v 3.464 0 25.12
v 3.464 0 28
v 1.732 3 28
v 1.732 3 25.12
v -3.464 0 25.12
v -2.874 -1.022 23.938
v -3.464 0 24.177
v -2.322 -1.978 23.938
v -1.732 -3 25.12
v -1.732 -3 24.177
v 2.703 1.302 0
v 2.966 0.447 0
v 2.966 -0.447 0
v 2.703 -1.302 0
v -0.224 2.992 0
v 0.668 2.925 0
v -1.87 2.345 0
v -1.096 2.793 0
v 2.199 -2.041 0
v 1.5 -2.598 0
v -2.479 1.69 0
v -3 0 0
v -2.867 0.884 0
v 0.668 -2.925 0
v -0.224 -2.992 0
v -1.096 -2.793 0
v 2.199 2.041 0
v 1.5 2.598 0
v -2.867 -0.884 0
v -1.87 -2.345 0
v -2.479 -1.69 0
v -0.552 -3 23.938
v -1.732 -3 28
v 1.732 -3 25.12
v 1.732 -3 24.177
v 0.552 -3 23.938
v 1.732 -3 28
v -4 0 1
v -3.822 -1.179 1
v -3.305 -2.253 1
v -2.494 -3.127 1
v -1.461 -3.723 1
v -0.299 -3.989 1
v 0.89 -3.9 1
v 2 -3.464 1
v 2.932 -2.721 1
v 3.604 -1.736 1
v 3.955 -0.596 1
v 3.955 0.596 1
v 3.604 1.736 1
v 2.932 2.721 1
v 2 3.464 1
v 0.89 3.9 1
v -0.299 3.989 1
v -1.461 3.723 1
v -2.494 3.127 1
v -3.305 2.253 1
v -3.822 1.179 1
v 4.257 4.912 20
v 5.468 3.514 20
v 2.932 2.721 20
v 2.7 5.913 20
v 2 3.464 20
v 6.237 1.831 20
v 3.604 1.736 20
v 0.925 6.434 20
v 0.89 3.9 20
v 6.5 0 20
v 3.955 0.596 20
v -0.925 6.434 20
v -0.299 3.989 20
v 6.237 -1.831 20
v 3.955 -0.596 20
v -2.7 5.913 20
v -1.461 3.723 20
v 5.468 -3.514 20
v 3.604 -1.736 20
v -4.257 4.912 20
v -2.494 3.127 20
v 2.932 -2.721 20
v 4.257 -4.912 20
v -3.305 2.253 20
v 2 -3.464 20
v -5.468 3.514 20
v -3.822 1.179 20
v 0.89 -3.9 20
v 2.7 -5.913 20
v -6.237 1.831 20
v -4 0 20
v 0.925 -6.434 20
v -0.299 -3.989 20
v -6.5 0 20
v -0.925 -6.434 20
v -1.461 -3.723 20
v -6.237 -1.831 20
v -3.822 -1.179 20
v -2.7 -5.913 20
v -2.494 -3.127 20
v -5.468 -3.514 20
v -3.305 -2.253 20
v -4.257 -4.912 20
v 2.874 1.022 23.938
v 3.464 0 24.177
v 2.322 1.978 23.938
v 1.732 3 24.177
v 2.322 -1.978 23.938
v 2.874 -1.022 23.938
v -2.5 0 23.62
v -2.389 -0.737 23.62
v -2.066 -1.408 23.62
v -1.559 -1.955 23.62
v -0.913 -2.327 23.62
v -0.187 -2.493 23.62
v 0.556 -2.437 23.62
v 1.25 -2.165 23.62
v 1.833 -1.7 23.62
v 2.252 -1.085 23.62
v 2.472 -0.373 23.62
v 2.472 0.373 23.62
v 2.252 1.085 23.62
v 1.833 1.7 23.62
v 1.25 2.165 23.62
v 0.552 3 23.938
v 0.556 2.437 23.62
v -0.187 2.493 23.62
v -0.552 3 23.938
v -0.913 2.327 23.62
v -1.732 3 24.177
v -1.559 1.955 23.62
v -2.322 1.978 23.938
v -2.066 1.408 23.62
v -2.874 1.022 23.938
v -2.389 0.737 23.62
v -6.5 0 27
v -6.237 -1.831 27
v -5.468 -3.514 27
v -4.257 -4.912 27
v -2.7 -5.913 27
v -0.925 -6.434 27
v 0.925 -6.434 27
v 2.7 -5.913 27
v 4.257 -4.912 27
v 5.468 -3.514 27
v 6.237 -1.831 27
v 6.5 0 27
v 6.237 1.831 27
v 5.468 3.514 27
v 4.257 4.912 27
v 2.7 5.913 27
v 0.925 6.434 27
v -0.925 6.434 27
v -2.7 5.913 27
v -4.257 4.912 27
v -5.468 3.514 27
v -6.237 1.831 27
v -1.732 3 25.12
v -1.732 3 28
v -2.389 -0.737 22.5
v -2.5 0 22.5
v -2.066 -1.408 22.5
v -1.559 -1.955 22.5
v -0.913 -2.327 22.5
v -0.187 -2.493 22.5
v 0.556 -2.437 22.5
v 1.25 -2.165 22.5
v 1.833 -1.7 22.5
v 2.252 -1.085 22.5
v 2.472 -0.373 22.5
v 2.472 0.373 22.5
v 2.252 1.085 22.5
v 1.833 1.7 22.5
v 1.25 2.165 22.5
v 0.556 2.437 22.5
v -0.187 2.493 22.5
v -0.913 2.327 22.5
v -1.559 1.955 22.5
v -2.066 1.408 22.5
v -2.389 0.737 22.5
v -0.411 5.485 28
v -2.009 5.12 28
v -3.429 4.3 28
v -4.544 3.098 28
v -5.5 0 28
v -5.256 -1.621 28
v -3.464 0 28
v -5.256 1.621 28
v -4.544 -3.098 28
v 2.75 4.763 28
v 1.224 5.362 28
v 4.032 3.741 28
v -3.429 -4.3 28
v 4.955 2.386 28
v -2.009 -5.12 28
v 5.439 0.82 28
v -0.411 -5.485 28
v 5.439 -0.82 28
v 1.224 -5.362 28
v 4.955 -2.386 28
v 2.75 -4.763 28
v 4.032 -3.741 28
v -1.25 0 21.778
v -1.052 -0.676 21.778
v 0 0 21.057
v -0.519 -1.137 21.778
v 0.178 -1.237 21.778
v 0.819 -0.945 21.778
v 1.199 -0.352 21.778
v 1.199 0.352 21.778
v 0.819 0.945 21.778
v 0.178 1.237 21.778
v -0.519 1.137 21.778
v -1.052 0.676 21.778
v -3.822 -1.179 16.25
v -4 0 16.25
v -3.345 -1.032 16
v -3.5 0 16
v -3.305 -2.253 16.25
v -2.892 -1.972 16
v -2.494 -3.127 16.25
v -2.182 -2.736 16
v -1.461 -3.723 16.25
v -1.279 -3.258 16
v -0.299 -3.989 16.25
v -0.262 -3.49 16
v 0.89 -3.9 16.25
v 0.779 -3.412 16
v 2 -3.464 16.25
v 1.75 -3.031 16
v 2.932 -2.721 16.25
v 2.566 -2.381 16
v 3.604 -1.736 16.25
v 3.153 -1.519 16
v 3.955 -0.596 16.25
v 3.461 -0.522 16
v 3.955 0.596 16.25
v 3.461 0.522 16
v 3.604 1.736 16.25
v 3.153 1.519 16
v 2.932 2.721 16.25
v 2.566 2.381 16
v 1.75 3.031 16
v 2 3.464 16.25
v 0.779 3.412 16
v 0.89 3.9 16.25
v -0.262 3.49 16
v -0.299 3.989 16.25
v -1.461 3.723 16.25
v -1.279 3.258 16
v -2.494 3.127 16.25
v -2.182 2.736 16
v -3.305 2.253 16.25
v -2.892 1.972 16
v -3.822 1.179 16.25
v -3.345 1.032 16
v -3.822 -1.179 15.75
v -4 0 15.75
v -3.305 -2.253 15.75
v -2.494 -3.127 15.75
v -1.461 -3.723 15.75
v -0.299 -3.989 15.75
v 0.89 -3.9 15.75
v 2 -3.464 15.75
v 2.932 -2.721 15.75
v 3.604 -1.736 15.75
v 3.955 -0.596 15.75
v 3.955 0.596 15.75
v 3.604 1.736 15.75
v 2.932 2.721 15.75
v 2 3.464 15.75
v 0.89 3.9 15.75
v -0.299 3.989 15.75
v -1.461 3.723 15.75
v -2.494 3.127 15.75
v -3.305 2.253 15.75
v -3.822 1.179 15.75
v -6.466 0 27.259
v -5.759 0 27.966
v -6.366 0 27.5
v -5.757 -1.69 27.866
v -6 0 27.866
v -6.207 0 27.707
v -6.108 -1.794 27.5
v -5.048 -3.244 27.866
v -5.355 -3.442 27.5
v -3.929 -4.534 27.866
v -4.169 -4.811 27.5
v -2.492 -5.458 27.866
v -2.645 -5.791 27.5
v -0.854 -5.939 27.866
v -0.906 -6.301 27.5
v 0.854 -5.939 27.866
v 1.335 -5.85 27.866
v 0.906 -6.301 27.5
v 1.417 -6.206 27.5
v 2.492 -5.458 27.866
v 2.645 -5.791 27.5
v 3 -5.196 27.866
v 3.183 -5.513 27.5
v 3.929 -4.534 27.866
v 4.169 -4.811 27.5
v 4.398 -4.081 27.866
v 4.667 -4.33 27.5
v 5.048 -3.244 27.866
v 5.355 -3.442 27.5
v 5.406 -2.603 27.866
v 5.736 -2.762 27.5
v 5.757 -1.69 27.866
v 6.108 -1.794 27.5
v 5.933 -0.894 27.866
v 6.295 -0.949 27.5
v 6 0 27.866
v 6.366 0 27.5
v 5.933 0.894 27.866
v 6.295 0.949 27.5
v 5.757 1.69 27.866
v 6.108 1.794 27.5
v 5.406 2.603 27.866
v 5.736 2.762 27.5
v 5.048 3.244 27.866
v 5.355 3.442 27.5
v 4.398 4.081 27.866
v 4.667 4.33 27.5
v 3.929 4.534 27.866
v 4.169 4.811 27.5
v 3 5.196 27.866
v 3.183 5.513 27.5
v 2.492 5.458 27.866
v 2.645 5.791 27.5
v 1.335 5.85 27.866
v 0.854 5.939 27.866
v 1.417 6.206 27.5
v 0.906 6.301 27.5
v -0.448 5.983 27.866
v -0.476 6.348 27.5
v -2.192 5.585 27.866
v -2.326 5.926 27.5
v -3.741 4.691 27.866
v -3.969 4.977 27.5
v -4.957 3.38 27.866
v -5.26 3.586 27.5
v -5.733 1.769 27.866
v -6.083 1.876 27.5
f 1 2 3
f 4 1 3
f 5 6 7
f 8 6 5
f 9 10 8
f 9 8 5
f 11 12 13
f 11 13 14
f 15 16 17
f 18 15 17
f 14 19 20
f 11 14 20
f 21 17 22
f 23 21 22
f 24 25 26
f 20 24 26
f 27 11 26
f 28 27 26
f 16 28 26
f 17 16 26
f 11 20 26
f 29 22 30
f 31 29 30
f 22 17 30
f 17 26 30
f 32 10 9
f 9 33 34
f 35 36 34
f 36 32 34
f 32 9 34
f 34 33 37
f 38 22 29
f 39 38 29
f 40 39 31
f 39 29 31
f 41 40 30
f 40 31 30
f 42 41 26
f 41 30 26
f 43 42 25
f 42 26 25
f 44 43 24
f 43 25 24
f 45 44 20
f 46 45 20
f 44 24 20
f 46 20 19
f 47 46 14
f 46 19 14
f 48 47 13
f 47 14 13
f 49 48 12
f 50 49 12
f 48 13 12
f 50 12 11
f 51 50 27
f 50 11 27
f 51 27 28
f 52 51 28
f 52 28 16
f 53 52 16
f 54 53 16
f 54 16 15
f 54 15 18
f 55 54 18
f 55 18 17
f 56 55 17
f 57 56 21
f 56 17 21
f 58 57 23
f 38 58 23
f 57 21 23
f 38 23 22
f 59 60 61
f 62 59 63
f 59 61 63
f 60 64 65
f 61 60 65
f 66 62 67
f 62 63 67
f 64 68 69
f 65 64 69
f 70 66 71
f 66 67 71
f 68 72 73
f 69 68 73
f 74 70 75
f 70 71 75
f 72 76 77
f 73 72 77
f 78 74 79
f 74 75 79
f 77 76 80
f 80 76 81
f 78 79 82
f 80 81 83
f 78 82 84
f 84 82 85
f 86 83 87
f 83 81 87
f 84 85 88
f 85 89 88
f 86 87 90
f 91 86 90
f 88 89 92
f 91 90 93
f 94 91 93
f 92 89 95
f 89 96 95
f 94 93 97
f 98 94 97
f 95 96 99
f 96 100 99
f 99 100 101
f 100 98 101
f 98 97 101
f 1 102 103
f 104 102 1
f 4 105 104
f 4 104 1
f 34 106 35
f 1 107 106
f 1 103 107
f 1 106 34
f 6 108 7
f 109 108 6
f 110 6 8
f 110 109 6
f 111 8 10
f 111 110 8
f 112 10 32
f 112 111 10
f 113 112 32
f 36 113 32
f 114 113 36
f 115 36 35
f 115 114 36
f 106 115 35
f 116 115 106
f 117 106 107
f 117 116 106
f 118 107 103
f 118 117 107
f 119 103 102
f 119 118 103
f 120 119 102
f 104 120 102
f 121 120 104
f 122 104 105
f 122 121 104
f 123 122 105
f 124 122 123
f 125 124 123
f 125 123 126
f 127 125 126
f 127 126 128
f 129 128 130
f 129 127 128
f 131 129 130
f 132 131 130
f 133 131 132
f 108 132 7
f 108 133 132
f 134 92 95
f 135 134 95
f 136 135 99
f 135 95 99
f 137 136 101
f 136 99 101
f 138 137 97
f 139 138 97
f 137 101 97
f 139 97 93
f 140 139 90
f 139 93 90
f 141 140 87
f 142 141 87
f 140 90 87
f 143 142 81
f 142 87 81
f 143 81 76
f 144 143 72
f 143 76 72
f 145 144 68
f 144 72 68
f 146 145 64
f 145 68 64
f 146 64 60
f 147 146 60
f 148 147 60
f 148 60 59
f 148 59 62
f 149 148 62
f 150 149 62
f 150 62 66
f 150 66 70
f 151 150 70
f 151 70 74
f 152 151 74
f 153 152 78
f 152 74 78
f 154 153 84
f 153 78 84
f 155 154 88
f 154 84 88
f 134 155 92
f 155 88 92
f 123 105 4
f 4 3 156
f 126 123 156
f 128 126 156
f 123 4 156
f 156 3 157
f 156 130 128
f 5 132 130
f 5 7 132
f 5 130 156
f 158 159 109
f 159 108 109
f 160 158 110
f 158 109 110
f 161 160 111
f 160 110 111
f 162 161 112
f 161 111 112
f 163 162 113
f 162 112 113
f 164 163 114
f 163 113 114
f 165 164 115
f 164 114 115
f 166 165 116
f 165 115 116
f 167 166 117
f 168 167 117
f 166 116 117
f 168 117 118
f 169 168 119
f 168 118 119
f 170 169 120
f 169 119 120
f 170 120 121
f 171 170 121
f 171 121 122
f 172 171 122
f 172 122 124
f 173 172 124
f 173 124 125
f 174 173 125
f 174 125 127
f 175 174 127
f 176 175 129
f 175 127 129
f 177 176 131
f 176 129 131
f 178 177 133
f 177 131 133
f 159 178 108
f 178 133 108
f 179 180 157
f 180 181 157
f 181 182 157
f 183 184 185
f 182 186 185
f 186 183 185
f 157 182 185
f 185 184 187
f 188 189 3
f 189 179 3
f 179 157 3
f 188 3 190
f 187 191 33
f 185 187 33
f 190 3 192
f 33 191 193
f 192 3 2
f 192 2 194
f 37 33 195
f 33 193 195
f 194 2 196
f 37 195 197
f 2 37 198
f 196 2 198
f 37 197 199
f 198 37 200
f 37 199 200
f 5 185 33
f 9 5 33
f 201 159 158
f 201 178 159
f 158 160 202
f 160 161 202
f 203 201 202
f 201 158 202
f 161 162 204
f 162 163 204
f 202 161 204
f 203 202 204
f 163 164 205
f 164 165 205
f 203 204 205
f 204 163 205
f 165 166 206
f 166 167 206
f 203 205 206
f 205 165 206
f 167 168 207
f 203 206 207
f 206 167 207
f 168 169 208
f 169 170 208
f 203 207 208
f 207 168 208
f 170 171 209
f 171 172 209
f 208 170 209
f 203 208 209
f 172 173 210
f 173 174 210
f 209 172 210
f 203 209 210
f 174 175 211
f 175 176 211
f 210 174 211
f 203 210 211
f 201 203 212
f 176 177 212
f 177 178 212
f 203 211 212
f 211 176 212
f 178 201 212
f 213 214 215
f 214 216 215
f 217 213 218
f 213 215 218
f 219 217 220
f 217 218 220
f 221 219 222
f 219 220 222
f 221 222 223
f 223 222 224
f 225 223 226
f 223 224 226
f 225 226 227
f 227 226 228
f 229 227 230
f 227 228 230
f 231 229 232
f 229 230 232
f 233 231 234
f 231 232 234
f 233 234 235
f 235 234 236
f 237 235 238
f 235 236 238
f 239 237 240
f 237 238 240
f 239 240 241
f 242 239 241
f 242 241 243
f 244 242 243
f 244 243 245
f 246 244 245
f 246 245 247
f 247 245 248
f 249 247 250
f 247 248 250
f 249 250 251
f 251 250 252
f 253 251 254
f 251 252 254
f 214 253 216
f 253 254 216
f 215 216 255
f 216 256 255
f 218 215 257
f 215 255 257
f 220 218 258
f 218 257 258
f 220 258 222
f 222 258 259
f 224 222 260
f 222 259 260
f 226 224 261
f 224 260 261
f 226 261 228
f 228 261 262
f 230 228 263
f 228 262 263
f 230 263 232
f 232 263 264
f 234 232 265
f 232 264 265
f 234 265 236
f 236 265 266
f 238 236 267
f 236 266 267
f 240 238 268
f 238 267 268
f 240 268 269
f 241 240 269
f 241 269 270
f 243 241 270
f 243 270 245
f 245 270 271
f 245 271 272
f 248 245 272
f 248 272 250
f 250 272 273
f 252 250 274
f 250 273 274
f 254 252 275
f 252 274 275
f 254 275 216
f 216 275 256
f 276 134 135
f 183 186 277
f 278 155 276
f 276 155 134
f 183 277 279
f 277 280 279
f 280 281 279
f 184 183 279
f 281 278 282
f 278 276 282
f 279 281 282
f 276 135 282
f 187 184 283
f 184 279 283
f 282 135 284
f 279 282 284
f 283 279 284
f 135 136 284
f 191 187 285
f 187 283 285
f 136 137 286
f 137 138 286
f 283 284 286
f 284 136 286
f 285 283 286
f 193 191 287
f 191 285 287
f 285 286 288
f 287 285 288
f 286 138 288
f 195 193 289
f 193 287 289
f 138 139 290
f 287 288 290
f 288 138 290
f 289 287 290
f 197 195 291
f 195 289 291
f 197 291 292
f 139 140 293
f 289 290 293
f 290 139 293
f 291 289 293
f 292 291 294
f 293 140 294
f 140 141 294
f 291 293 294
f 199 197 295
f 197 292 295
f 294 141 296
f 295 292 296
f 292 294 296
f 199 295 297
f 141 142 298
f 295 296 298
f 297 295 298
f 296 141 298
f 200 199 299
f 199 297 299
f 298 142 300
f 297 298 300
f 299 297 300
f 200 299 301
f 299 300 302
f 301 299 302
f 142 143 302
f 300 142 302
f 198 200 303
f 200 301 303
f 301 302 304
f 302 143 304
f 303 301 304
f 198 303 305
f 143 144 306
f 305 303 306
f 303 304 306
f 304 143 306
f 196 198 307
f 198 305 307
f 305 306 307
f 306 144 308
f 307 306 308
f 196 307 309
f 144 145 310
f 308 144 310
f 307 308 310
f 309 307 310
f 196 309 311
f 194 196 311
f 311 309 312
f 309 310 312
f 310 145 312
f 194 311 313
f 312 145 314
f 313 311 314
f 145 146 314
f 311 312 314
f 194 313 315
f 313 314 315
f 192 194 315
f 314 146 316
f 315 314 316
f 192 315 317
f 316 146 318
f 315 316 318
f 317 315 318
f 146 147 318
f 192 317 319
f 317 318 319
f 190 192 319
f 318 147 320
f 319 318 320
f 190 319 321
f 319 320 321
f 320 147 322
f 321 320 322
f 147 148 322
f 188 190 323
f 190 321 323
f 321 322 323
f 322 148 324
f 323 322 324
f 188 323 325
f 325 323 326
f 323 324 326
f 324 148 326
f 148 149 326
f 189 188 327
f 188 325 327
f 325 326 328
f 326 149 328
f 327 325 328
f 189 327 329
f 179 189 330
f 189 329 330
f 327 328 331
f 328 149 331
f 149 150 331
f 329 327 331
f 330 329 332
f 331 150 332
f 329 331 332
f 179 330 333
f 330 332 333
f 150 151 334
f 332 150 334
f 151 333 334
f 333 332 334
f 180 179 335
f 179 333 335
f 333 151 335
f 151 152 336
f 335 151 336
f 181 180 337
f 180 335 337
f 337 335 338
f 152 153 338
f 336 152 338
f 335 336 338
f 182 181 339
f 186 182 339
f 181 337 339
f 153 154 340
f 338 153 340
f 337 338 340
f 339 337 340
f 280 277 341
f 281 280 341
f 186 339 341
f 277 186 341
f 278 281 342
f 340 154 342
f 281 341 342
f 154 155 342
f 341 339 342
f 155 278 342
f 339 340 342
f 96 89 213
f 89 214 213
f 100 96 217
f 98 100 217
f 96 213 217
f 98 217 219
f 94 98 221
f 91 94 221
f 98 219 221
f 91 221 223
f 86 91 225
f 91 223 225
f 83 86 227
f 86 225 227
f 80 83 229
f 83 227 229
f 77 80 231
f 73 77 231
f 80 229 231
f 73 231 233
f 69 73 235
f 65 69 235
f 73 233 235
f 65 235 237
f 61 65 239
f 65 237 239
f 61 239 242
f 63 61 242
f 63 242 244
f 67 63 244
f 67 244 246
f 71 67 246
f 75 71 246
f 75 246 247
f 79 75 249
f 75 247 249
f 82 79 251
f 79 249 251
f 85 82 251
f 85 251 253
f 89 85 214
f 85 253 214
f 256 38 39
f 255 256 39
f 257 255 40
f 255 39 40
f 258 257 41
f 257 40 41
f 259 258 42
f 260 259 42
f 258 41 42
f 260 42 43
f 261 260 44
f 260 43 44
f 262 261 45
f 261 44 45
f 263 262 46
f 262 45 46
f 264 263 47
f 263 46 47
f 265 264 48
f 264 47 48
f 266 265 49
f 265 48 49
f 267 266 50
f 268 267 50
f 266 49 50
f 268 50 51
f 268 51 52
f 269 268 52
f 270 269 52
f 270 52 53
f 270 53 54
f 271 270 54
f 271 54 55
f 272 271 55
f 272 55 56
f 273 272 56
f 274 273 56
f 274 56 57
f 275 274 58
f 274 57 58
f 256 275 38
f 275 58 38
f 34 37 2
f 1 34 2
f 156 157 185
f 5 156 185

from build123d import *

# Parameters (mm, degrees)
F2_R     = 1
F3_SIZE  = 1
F5_DEPTH = 2.88


# Not quite as in the source:
# - a fillet or chamfer that OpenCascade refuses, or shapes differently, is made with other operations: its cross-section is extruded or revolved along the edge and cut away or added


with BuildPart() as f1:
    # F0 (on Front) → F1 (revolve)
    with BuildSketch(Plane.XZ):
        Polygon((-4, 0), (0, 0), (0, 21.056624327), (-2.5, 22.5), (-2.5, 28), (-6.5, 28), (-6.5, 20), (-4, 20), (-4, 16.25), (-3.5, 16), (-4, 15.75), align=None)
    revolve(axis=Axis((0, 0, 18.332445994), (0, 0, 1)))

    # F2
    f2_edges = [f1.edges().sort_by_distance(p)[0] for p in [
        (6.5, 0, 28),
    ]]
    fillet(f2_edges, radius=F2_R)

    # F3
    f3_edges = [f1.edges().sort_by_distance(p)[0] for p in [
        (4, 0, 0),
    ]]
    chamfer(f3_edges, length=F3_SIZE)

    # F4 (on face) → F5 (cut)
    with BuildSketch(Plane.XY.offset(28)):
        Polygon((-1.7320508076, -3), (1.7320508076, -3), (3.4641016151, 0), (1.7320508076, 3), (-1.7320508076, 3), (-3.4641016151, 0), align=None)
    extrude(amount=-F5_DEPTH, mode=Mode.SUBTRACT)

    # F6: chamfer of 1.5 x 2.5980762114 on 1 edges, made by hand


with BuildPart() as f6_tool2:
    # F6_s3 → F6_t4 (revolve)
    with BuildSketch(Plane.XZ):
        Polygon((-5.0980762114, 25.12), (-2.5, 23.62), (-2.5, 25.12), align=None)
    revolve(axis=Axis((0, 0, 25.12), (0, 0, 1)))

    split(bisect_by=Plane(origin=(-2.5980762114, -1.5, 0), x_dir=(0, 0, 1), z_dir=(0.8660254038, 0.5, 0)), keep=Keep.TOP)

    split(bisect_by=Plane(origin=(-2.5980762114, 1.5, 0), x_dir=(0, 0, 1), z_dir=(0.8660254038, -0.5, 0)), keep=Keep.TOP)

    split(bisect_by=Plane.XZ.offset(-3), keep=Keep.TOP)

    split(bisect_by=Plane(origin=(2.5980762114, 1.5, 0), x_dir=(0, 0, 1), z_dir=(-0.8660254038, -0.5, 0)), keep=Keep.TOP)

    split(bisect_by=Plane(origin=(2.5980762114, -1.5, 0), x_dir=(0, 0, 1), z_dir=(-0.8660254038, 0.5, 0)), keep=Keep.TOP)

    split(bisect_by=Plane.XZ.offset(3), keep=Keep.BOTTOM)


with BuildPart() as f1_1:
    add(f1.part)

    # F6_t1: cut F6_tool2
    add(f6_tool2.part, mode=Mode.SUBTRACT)


solid = f1_1.part
